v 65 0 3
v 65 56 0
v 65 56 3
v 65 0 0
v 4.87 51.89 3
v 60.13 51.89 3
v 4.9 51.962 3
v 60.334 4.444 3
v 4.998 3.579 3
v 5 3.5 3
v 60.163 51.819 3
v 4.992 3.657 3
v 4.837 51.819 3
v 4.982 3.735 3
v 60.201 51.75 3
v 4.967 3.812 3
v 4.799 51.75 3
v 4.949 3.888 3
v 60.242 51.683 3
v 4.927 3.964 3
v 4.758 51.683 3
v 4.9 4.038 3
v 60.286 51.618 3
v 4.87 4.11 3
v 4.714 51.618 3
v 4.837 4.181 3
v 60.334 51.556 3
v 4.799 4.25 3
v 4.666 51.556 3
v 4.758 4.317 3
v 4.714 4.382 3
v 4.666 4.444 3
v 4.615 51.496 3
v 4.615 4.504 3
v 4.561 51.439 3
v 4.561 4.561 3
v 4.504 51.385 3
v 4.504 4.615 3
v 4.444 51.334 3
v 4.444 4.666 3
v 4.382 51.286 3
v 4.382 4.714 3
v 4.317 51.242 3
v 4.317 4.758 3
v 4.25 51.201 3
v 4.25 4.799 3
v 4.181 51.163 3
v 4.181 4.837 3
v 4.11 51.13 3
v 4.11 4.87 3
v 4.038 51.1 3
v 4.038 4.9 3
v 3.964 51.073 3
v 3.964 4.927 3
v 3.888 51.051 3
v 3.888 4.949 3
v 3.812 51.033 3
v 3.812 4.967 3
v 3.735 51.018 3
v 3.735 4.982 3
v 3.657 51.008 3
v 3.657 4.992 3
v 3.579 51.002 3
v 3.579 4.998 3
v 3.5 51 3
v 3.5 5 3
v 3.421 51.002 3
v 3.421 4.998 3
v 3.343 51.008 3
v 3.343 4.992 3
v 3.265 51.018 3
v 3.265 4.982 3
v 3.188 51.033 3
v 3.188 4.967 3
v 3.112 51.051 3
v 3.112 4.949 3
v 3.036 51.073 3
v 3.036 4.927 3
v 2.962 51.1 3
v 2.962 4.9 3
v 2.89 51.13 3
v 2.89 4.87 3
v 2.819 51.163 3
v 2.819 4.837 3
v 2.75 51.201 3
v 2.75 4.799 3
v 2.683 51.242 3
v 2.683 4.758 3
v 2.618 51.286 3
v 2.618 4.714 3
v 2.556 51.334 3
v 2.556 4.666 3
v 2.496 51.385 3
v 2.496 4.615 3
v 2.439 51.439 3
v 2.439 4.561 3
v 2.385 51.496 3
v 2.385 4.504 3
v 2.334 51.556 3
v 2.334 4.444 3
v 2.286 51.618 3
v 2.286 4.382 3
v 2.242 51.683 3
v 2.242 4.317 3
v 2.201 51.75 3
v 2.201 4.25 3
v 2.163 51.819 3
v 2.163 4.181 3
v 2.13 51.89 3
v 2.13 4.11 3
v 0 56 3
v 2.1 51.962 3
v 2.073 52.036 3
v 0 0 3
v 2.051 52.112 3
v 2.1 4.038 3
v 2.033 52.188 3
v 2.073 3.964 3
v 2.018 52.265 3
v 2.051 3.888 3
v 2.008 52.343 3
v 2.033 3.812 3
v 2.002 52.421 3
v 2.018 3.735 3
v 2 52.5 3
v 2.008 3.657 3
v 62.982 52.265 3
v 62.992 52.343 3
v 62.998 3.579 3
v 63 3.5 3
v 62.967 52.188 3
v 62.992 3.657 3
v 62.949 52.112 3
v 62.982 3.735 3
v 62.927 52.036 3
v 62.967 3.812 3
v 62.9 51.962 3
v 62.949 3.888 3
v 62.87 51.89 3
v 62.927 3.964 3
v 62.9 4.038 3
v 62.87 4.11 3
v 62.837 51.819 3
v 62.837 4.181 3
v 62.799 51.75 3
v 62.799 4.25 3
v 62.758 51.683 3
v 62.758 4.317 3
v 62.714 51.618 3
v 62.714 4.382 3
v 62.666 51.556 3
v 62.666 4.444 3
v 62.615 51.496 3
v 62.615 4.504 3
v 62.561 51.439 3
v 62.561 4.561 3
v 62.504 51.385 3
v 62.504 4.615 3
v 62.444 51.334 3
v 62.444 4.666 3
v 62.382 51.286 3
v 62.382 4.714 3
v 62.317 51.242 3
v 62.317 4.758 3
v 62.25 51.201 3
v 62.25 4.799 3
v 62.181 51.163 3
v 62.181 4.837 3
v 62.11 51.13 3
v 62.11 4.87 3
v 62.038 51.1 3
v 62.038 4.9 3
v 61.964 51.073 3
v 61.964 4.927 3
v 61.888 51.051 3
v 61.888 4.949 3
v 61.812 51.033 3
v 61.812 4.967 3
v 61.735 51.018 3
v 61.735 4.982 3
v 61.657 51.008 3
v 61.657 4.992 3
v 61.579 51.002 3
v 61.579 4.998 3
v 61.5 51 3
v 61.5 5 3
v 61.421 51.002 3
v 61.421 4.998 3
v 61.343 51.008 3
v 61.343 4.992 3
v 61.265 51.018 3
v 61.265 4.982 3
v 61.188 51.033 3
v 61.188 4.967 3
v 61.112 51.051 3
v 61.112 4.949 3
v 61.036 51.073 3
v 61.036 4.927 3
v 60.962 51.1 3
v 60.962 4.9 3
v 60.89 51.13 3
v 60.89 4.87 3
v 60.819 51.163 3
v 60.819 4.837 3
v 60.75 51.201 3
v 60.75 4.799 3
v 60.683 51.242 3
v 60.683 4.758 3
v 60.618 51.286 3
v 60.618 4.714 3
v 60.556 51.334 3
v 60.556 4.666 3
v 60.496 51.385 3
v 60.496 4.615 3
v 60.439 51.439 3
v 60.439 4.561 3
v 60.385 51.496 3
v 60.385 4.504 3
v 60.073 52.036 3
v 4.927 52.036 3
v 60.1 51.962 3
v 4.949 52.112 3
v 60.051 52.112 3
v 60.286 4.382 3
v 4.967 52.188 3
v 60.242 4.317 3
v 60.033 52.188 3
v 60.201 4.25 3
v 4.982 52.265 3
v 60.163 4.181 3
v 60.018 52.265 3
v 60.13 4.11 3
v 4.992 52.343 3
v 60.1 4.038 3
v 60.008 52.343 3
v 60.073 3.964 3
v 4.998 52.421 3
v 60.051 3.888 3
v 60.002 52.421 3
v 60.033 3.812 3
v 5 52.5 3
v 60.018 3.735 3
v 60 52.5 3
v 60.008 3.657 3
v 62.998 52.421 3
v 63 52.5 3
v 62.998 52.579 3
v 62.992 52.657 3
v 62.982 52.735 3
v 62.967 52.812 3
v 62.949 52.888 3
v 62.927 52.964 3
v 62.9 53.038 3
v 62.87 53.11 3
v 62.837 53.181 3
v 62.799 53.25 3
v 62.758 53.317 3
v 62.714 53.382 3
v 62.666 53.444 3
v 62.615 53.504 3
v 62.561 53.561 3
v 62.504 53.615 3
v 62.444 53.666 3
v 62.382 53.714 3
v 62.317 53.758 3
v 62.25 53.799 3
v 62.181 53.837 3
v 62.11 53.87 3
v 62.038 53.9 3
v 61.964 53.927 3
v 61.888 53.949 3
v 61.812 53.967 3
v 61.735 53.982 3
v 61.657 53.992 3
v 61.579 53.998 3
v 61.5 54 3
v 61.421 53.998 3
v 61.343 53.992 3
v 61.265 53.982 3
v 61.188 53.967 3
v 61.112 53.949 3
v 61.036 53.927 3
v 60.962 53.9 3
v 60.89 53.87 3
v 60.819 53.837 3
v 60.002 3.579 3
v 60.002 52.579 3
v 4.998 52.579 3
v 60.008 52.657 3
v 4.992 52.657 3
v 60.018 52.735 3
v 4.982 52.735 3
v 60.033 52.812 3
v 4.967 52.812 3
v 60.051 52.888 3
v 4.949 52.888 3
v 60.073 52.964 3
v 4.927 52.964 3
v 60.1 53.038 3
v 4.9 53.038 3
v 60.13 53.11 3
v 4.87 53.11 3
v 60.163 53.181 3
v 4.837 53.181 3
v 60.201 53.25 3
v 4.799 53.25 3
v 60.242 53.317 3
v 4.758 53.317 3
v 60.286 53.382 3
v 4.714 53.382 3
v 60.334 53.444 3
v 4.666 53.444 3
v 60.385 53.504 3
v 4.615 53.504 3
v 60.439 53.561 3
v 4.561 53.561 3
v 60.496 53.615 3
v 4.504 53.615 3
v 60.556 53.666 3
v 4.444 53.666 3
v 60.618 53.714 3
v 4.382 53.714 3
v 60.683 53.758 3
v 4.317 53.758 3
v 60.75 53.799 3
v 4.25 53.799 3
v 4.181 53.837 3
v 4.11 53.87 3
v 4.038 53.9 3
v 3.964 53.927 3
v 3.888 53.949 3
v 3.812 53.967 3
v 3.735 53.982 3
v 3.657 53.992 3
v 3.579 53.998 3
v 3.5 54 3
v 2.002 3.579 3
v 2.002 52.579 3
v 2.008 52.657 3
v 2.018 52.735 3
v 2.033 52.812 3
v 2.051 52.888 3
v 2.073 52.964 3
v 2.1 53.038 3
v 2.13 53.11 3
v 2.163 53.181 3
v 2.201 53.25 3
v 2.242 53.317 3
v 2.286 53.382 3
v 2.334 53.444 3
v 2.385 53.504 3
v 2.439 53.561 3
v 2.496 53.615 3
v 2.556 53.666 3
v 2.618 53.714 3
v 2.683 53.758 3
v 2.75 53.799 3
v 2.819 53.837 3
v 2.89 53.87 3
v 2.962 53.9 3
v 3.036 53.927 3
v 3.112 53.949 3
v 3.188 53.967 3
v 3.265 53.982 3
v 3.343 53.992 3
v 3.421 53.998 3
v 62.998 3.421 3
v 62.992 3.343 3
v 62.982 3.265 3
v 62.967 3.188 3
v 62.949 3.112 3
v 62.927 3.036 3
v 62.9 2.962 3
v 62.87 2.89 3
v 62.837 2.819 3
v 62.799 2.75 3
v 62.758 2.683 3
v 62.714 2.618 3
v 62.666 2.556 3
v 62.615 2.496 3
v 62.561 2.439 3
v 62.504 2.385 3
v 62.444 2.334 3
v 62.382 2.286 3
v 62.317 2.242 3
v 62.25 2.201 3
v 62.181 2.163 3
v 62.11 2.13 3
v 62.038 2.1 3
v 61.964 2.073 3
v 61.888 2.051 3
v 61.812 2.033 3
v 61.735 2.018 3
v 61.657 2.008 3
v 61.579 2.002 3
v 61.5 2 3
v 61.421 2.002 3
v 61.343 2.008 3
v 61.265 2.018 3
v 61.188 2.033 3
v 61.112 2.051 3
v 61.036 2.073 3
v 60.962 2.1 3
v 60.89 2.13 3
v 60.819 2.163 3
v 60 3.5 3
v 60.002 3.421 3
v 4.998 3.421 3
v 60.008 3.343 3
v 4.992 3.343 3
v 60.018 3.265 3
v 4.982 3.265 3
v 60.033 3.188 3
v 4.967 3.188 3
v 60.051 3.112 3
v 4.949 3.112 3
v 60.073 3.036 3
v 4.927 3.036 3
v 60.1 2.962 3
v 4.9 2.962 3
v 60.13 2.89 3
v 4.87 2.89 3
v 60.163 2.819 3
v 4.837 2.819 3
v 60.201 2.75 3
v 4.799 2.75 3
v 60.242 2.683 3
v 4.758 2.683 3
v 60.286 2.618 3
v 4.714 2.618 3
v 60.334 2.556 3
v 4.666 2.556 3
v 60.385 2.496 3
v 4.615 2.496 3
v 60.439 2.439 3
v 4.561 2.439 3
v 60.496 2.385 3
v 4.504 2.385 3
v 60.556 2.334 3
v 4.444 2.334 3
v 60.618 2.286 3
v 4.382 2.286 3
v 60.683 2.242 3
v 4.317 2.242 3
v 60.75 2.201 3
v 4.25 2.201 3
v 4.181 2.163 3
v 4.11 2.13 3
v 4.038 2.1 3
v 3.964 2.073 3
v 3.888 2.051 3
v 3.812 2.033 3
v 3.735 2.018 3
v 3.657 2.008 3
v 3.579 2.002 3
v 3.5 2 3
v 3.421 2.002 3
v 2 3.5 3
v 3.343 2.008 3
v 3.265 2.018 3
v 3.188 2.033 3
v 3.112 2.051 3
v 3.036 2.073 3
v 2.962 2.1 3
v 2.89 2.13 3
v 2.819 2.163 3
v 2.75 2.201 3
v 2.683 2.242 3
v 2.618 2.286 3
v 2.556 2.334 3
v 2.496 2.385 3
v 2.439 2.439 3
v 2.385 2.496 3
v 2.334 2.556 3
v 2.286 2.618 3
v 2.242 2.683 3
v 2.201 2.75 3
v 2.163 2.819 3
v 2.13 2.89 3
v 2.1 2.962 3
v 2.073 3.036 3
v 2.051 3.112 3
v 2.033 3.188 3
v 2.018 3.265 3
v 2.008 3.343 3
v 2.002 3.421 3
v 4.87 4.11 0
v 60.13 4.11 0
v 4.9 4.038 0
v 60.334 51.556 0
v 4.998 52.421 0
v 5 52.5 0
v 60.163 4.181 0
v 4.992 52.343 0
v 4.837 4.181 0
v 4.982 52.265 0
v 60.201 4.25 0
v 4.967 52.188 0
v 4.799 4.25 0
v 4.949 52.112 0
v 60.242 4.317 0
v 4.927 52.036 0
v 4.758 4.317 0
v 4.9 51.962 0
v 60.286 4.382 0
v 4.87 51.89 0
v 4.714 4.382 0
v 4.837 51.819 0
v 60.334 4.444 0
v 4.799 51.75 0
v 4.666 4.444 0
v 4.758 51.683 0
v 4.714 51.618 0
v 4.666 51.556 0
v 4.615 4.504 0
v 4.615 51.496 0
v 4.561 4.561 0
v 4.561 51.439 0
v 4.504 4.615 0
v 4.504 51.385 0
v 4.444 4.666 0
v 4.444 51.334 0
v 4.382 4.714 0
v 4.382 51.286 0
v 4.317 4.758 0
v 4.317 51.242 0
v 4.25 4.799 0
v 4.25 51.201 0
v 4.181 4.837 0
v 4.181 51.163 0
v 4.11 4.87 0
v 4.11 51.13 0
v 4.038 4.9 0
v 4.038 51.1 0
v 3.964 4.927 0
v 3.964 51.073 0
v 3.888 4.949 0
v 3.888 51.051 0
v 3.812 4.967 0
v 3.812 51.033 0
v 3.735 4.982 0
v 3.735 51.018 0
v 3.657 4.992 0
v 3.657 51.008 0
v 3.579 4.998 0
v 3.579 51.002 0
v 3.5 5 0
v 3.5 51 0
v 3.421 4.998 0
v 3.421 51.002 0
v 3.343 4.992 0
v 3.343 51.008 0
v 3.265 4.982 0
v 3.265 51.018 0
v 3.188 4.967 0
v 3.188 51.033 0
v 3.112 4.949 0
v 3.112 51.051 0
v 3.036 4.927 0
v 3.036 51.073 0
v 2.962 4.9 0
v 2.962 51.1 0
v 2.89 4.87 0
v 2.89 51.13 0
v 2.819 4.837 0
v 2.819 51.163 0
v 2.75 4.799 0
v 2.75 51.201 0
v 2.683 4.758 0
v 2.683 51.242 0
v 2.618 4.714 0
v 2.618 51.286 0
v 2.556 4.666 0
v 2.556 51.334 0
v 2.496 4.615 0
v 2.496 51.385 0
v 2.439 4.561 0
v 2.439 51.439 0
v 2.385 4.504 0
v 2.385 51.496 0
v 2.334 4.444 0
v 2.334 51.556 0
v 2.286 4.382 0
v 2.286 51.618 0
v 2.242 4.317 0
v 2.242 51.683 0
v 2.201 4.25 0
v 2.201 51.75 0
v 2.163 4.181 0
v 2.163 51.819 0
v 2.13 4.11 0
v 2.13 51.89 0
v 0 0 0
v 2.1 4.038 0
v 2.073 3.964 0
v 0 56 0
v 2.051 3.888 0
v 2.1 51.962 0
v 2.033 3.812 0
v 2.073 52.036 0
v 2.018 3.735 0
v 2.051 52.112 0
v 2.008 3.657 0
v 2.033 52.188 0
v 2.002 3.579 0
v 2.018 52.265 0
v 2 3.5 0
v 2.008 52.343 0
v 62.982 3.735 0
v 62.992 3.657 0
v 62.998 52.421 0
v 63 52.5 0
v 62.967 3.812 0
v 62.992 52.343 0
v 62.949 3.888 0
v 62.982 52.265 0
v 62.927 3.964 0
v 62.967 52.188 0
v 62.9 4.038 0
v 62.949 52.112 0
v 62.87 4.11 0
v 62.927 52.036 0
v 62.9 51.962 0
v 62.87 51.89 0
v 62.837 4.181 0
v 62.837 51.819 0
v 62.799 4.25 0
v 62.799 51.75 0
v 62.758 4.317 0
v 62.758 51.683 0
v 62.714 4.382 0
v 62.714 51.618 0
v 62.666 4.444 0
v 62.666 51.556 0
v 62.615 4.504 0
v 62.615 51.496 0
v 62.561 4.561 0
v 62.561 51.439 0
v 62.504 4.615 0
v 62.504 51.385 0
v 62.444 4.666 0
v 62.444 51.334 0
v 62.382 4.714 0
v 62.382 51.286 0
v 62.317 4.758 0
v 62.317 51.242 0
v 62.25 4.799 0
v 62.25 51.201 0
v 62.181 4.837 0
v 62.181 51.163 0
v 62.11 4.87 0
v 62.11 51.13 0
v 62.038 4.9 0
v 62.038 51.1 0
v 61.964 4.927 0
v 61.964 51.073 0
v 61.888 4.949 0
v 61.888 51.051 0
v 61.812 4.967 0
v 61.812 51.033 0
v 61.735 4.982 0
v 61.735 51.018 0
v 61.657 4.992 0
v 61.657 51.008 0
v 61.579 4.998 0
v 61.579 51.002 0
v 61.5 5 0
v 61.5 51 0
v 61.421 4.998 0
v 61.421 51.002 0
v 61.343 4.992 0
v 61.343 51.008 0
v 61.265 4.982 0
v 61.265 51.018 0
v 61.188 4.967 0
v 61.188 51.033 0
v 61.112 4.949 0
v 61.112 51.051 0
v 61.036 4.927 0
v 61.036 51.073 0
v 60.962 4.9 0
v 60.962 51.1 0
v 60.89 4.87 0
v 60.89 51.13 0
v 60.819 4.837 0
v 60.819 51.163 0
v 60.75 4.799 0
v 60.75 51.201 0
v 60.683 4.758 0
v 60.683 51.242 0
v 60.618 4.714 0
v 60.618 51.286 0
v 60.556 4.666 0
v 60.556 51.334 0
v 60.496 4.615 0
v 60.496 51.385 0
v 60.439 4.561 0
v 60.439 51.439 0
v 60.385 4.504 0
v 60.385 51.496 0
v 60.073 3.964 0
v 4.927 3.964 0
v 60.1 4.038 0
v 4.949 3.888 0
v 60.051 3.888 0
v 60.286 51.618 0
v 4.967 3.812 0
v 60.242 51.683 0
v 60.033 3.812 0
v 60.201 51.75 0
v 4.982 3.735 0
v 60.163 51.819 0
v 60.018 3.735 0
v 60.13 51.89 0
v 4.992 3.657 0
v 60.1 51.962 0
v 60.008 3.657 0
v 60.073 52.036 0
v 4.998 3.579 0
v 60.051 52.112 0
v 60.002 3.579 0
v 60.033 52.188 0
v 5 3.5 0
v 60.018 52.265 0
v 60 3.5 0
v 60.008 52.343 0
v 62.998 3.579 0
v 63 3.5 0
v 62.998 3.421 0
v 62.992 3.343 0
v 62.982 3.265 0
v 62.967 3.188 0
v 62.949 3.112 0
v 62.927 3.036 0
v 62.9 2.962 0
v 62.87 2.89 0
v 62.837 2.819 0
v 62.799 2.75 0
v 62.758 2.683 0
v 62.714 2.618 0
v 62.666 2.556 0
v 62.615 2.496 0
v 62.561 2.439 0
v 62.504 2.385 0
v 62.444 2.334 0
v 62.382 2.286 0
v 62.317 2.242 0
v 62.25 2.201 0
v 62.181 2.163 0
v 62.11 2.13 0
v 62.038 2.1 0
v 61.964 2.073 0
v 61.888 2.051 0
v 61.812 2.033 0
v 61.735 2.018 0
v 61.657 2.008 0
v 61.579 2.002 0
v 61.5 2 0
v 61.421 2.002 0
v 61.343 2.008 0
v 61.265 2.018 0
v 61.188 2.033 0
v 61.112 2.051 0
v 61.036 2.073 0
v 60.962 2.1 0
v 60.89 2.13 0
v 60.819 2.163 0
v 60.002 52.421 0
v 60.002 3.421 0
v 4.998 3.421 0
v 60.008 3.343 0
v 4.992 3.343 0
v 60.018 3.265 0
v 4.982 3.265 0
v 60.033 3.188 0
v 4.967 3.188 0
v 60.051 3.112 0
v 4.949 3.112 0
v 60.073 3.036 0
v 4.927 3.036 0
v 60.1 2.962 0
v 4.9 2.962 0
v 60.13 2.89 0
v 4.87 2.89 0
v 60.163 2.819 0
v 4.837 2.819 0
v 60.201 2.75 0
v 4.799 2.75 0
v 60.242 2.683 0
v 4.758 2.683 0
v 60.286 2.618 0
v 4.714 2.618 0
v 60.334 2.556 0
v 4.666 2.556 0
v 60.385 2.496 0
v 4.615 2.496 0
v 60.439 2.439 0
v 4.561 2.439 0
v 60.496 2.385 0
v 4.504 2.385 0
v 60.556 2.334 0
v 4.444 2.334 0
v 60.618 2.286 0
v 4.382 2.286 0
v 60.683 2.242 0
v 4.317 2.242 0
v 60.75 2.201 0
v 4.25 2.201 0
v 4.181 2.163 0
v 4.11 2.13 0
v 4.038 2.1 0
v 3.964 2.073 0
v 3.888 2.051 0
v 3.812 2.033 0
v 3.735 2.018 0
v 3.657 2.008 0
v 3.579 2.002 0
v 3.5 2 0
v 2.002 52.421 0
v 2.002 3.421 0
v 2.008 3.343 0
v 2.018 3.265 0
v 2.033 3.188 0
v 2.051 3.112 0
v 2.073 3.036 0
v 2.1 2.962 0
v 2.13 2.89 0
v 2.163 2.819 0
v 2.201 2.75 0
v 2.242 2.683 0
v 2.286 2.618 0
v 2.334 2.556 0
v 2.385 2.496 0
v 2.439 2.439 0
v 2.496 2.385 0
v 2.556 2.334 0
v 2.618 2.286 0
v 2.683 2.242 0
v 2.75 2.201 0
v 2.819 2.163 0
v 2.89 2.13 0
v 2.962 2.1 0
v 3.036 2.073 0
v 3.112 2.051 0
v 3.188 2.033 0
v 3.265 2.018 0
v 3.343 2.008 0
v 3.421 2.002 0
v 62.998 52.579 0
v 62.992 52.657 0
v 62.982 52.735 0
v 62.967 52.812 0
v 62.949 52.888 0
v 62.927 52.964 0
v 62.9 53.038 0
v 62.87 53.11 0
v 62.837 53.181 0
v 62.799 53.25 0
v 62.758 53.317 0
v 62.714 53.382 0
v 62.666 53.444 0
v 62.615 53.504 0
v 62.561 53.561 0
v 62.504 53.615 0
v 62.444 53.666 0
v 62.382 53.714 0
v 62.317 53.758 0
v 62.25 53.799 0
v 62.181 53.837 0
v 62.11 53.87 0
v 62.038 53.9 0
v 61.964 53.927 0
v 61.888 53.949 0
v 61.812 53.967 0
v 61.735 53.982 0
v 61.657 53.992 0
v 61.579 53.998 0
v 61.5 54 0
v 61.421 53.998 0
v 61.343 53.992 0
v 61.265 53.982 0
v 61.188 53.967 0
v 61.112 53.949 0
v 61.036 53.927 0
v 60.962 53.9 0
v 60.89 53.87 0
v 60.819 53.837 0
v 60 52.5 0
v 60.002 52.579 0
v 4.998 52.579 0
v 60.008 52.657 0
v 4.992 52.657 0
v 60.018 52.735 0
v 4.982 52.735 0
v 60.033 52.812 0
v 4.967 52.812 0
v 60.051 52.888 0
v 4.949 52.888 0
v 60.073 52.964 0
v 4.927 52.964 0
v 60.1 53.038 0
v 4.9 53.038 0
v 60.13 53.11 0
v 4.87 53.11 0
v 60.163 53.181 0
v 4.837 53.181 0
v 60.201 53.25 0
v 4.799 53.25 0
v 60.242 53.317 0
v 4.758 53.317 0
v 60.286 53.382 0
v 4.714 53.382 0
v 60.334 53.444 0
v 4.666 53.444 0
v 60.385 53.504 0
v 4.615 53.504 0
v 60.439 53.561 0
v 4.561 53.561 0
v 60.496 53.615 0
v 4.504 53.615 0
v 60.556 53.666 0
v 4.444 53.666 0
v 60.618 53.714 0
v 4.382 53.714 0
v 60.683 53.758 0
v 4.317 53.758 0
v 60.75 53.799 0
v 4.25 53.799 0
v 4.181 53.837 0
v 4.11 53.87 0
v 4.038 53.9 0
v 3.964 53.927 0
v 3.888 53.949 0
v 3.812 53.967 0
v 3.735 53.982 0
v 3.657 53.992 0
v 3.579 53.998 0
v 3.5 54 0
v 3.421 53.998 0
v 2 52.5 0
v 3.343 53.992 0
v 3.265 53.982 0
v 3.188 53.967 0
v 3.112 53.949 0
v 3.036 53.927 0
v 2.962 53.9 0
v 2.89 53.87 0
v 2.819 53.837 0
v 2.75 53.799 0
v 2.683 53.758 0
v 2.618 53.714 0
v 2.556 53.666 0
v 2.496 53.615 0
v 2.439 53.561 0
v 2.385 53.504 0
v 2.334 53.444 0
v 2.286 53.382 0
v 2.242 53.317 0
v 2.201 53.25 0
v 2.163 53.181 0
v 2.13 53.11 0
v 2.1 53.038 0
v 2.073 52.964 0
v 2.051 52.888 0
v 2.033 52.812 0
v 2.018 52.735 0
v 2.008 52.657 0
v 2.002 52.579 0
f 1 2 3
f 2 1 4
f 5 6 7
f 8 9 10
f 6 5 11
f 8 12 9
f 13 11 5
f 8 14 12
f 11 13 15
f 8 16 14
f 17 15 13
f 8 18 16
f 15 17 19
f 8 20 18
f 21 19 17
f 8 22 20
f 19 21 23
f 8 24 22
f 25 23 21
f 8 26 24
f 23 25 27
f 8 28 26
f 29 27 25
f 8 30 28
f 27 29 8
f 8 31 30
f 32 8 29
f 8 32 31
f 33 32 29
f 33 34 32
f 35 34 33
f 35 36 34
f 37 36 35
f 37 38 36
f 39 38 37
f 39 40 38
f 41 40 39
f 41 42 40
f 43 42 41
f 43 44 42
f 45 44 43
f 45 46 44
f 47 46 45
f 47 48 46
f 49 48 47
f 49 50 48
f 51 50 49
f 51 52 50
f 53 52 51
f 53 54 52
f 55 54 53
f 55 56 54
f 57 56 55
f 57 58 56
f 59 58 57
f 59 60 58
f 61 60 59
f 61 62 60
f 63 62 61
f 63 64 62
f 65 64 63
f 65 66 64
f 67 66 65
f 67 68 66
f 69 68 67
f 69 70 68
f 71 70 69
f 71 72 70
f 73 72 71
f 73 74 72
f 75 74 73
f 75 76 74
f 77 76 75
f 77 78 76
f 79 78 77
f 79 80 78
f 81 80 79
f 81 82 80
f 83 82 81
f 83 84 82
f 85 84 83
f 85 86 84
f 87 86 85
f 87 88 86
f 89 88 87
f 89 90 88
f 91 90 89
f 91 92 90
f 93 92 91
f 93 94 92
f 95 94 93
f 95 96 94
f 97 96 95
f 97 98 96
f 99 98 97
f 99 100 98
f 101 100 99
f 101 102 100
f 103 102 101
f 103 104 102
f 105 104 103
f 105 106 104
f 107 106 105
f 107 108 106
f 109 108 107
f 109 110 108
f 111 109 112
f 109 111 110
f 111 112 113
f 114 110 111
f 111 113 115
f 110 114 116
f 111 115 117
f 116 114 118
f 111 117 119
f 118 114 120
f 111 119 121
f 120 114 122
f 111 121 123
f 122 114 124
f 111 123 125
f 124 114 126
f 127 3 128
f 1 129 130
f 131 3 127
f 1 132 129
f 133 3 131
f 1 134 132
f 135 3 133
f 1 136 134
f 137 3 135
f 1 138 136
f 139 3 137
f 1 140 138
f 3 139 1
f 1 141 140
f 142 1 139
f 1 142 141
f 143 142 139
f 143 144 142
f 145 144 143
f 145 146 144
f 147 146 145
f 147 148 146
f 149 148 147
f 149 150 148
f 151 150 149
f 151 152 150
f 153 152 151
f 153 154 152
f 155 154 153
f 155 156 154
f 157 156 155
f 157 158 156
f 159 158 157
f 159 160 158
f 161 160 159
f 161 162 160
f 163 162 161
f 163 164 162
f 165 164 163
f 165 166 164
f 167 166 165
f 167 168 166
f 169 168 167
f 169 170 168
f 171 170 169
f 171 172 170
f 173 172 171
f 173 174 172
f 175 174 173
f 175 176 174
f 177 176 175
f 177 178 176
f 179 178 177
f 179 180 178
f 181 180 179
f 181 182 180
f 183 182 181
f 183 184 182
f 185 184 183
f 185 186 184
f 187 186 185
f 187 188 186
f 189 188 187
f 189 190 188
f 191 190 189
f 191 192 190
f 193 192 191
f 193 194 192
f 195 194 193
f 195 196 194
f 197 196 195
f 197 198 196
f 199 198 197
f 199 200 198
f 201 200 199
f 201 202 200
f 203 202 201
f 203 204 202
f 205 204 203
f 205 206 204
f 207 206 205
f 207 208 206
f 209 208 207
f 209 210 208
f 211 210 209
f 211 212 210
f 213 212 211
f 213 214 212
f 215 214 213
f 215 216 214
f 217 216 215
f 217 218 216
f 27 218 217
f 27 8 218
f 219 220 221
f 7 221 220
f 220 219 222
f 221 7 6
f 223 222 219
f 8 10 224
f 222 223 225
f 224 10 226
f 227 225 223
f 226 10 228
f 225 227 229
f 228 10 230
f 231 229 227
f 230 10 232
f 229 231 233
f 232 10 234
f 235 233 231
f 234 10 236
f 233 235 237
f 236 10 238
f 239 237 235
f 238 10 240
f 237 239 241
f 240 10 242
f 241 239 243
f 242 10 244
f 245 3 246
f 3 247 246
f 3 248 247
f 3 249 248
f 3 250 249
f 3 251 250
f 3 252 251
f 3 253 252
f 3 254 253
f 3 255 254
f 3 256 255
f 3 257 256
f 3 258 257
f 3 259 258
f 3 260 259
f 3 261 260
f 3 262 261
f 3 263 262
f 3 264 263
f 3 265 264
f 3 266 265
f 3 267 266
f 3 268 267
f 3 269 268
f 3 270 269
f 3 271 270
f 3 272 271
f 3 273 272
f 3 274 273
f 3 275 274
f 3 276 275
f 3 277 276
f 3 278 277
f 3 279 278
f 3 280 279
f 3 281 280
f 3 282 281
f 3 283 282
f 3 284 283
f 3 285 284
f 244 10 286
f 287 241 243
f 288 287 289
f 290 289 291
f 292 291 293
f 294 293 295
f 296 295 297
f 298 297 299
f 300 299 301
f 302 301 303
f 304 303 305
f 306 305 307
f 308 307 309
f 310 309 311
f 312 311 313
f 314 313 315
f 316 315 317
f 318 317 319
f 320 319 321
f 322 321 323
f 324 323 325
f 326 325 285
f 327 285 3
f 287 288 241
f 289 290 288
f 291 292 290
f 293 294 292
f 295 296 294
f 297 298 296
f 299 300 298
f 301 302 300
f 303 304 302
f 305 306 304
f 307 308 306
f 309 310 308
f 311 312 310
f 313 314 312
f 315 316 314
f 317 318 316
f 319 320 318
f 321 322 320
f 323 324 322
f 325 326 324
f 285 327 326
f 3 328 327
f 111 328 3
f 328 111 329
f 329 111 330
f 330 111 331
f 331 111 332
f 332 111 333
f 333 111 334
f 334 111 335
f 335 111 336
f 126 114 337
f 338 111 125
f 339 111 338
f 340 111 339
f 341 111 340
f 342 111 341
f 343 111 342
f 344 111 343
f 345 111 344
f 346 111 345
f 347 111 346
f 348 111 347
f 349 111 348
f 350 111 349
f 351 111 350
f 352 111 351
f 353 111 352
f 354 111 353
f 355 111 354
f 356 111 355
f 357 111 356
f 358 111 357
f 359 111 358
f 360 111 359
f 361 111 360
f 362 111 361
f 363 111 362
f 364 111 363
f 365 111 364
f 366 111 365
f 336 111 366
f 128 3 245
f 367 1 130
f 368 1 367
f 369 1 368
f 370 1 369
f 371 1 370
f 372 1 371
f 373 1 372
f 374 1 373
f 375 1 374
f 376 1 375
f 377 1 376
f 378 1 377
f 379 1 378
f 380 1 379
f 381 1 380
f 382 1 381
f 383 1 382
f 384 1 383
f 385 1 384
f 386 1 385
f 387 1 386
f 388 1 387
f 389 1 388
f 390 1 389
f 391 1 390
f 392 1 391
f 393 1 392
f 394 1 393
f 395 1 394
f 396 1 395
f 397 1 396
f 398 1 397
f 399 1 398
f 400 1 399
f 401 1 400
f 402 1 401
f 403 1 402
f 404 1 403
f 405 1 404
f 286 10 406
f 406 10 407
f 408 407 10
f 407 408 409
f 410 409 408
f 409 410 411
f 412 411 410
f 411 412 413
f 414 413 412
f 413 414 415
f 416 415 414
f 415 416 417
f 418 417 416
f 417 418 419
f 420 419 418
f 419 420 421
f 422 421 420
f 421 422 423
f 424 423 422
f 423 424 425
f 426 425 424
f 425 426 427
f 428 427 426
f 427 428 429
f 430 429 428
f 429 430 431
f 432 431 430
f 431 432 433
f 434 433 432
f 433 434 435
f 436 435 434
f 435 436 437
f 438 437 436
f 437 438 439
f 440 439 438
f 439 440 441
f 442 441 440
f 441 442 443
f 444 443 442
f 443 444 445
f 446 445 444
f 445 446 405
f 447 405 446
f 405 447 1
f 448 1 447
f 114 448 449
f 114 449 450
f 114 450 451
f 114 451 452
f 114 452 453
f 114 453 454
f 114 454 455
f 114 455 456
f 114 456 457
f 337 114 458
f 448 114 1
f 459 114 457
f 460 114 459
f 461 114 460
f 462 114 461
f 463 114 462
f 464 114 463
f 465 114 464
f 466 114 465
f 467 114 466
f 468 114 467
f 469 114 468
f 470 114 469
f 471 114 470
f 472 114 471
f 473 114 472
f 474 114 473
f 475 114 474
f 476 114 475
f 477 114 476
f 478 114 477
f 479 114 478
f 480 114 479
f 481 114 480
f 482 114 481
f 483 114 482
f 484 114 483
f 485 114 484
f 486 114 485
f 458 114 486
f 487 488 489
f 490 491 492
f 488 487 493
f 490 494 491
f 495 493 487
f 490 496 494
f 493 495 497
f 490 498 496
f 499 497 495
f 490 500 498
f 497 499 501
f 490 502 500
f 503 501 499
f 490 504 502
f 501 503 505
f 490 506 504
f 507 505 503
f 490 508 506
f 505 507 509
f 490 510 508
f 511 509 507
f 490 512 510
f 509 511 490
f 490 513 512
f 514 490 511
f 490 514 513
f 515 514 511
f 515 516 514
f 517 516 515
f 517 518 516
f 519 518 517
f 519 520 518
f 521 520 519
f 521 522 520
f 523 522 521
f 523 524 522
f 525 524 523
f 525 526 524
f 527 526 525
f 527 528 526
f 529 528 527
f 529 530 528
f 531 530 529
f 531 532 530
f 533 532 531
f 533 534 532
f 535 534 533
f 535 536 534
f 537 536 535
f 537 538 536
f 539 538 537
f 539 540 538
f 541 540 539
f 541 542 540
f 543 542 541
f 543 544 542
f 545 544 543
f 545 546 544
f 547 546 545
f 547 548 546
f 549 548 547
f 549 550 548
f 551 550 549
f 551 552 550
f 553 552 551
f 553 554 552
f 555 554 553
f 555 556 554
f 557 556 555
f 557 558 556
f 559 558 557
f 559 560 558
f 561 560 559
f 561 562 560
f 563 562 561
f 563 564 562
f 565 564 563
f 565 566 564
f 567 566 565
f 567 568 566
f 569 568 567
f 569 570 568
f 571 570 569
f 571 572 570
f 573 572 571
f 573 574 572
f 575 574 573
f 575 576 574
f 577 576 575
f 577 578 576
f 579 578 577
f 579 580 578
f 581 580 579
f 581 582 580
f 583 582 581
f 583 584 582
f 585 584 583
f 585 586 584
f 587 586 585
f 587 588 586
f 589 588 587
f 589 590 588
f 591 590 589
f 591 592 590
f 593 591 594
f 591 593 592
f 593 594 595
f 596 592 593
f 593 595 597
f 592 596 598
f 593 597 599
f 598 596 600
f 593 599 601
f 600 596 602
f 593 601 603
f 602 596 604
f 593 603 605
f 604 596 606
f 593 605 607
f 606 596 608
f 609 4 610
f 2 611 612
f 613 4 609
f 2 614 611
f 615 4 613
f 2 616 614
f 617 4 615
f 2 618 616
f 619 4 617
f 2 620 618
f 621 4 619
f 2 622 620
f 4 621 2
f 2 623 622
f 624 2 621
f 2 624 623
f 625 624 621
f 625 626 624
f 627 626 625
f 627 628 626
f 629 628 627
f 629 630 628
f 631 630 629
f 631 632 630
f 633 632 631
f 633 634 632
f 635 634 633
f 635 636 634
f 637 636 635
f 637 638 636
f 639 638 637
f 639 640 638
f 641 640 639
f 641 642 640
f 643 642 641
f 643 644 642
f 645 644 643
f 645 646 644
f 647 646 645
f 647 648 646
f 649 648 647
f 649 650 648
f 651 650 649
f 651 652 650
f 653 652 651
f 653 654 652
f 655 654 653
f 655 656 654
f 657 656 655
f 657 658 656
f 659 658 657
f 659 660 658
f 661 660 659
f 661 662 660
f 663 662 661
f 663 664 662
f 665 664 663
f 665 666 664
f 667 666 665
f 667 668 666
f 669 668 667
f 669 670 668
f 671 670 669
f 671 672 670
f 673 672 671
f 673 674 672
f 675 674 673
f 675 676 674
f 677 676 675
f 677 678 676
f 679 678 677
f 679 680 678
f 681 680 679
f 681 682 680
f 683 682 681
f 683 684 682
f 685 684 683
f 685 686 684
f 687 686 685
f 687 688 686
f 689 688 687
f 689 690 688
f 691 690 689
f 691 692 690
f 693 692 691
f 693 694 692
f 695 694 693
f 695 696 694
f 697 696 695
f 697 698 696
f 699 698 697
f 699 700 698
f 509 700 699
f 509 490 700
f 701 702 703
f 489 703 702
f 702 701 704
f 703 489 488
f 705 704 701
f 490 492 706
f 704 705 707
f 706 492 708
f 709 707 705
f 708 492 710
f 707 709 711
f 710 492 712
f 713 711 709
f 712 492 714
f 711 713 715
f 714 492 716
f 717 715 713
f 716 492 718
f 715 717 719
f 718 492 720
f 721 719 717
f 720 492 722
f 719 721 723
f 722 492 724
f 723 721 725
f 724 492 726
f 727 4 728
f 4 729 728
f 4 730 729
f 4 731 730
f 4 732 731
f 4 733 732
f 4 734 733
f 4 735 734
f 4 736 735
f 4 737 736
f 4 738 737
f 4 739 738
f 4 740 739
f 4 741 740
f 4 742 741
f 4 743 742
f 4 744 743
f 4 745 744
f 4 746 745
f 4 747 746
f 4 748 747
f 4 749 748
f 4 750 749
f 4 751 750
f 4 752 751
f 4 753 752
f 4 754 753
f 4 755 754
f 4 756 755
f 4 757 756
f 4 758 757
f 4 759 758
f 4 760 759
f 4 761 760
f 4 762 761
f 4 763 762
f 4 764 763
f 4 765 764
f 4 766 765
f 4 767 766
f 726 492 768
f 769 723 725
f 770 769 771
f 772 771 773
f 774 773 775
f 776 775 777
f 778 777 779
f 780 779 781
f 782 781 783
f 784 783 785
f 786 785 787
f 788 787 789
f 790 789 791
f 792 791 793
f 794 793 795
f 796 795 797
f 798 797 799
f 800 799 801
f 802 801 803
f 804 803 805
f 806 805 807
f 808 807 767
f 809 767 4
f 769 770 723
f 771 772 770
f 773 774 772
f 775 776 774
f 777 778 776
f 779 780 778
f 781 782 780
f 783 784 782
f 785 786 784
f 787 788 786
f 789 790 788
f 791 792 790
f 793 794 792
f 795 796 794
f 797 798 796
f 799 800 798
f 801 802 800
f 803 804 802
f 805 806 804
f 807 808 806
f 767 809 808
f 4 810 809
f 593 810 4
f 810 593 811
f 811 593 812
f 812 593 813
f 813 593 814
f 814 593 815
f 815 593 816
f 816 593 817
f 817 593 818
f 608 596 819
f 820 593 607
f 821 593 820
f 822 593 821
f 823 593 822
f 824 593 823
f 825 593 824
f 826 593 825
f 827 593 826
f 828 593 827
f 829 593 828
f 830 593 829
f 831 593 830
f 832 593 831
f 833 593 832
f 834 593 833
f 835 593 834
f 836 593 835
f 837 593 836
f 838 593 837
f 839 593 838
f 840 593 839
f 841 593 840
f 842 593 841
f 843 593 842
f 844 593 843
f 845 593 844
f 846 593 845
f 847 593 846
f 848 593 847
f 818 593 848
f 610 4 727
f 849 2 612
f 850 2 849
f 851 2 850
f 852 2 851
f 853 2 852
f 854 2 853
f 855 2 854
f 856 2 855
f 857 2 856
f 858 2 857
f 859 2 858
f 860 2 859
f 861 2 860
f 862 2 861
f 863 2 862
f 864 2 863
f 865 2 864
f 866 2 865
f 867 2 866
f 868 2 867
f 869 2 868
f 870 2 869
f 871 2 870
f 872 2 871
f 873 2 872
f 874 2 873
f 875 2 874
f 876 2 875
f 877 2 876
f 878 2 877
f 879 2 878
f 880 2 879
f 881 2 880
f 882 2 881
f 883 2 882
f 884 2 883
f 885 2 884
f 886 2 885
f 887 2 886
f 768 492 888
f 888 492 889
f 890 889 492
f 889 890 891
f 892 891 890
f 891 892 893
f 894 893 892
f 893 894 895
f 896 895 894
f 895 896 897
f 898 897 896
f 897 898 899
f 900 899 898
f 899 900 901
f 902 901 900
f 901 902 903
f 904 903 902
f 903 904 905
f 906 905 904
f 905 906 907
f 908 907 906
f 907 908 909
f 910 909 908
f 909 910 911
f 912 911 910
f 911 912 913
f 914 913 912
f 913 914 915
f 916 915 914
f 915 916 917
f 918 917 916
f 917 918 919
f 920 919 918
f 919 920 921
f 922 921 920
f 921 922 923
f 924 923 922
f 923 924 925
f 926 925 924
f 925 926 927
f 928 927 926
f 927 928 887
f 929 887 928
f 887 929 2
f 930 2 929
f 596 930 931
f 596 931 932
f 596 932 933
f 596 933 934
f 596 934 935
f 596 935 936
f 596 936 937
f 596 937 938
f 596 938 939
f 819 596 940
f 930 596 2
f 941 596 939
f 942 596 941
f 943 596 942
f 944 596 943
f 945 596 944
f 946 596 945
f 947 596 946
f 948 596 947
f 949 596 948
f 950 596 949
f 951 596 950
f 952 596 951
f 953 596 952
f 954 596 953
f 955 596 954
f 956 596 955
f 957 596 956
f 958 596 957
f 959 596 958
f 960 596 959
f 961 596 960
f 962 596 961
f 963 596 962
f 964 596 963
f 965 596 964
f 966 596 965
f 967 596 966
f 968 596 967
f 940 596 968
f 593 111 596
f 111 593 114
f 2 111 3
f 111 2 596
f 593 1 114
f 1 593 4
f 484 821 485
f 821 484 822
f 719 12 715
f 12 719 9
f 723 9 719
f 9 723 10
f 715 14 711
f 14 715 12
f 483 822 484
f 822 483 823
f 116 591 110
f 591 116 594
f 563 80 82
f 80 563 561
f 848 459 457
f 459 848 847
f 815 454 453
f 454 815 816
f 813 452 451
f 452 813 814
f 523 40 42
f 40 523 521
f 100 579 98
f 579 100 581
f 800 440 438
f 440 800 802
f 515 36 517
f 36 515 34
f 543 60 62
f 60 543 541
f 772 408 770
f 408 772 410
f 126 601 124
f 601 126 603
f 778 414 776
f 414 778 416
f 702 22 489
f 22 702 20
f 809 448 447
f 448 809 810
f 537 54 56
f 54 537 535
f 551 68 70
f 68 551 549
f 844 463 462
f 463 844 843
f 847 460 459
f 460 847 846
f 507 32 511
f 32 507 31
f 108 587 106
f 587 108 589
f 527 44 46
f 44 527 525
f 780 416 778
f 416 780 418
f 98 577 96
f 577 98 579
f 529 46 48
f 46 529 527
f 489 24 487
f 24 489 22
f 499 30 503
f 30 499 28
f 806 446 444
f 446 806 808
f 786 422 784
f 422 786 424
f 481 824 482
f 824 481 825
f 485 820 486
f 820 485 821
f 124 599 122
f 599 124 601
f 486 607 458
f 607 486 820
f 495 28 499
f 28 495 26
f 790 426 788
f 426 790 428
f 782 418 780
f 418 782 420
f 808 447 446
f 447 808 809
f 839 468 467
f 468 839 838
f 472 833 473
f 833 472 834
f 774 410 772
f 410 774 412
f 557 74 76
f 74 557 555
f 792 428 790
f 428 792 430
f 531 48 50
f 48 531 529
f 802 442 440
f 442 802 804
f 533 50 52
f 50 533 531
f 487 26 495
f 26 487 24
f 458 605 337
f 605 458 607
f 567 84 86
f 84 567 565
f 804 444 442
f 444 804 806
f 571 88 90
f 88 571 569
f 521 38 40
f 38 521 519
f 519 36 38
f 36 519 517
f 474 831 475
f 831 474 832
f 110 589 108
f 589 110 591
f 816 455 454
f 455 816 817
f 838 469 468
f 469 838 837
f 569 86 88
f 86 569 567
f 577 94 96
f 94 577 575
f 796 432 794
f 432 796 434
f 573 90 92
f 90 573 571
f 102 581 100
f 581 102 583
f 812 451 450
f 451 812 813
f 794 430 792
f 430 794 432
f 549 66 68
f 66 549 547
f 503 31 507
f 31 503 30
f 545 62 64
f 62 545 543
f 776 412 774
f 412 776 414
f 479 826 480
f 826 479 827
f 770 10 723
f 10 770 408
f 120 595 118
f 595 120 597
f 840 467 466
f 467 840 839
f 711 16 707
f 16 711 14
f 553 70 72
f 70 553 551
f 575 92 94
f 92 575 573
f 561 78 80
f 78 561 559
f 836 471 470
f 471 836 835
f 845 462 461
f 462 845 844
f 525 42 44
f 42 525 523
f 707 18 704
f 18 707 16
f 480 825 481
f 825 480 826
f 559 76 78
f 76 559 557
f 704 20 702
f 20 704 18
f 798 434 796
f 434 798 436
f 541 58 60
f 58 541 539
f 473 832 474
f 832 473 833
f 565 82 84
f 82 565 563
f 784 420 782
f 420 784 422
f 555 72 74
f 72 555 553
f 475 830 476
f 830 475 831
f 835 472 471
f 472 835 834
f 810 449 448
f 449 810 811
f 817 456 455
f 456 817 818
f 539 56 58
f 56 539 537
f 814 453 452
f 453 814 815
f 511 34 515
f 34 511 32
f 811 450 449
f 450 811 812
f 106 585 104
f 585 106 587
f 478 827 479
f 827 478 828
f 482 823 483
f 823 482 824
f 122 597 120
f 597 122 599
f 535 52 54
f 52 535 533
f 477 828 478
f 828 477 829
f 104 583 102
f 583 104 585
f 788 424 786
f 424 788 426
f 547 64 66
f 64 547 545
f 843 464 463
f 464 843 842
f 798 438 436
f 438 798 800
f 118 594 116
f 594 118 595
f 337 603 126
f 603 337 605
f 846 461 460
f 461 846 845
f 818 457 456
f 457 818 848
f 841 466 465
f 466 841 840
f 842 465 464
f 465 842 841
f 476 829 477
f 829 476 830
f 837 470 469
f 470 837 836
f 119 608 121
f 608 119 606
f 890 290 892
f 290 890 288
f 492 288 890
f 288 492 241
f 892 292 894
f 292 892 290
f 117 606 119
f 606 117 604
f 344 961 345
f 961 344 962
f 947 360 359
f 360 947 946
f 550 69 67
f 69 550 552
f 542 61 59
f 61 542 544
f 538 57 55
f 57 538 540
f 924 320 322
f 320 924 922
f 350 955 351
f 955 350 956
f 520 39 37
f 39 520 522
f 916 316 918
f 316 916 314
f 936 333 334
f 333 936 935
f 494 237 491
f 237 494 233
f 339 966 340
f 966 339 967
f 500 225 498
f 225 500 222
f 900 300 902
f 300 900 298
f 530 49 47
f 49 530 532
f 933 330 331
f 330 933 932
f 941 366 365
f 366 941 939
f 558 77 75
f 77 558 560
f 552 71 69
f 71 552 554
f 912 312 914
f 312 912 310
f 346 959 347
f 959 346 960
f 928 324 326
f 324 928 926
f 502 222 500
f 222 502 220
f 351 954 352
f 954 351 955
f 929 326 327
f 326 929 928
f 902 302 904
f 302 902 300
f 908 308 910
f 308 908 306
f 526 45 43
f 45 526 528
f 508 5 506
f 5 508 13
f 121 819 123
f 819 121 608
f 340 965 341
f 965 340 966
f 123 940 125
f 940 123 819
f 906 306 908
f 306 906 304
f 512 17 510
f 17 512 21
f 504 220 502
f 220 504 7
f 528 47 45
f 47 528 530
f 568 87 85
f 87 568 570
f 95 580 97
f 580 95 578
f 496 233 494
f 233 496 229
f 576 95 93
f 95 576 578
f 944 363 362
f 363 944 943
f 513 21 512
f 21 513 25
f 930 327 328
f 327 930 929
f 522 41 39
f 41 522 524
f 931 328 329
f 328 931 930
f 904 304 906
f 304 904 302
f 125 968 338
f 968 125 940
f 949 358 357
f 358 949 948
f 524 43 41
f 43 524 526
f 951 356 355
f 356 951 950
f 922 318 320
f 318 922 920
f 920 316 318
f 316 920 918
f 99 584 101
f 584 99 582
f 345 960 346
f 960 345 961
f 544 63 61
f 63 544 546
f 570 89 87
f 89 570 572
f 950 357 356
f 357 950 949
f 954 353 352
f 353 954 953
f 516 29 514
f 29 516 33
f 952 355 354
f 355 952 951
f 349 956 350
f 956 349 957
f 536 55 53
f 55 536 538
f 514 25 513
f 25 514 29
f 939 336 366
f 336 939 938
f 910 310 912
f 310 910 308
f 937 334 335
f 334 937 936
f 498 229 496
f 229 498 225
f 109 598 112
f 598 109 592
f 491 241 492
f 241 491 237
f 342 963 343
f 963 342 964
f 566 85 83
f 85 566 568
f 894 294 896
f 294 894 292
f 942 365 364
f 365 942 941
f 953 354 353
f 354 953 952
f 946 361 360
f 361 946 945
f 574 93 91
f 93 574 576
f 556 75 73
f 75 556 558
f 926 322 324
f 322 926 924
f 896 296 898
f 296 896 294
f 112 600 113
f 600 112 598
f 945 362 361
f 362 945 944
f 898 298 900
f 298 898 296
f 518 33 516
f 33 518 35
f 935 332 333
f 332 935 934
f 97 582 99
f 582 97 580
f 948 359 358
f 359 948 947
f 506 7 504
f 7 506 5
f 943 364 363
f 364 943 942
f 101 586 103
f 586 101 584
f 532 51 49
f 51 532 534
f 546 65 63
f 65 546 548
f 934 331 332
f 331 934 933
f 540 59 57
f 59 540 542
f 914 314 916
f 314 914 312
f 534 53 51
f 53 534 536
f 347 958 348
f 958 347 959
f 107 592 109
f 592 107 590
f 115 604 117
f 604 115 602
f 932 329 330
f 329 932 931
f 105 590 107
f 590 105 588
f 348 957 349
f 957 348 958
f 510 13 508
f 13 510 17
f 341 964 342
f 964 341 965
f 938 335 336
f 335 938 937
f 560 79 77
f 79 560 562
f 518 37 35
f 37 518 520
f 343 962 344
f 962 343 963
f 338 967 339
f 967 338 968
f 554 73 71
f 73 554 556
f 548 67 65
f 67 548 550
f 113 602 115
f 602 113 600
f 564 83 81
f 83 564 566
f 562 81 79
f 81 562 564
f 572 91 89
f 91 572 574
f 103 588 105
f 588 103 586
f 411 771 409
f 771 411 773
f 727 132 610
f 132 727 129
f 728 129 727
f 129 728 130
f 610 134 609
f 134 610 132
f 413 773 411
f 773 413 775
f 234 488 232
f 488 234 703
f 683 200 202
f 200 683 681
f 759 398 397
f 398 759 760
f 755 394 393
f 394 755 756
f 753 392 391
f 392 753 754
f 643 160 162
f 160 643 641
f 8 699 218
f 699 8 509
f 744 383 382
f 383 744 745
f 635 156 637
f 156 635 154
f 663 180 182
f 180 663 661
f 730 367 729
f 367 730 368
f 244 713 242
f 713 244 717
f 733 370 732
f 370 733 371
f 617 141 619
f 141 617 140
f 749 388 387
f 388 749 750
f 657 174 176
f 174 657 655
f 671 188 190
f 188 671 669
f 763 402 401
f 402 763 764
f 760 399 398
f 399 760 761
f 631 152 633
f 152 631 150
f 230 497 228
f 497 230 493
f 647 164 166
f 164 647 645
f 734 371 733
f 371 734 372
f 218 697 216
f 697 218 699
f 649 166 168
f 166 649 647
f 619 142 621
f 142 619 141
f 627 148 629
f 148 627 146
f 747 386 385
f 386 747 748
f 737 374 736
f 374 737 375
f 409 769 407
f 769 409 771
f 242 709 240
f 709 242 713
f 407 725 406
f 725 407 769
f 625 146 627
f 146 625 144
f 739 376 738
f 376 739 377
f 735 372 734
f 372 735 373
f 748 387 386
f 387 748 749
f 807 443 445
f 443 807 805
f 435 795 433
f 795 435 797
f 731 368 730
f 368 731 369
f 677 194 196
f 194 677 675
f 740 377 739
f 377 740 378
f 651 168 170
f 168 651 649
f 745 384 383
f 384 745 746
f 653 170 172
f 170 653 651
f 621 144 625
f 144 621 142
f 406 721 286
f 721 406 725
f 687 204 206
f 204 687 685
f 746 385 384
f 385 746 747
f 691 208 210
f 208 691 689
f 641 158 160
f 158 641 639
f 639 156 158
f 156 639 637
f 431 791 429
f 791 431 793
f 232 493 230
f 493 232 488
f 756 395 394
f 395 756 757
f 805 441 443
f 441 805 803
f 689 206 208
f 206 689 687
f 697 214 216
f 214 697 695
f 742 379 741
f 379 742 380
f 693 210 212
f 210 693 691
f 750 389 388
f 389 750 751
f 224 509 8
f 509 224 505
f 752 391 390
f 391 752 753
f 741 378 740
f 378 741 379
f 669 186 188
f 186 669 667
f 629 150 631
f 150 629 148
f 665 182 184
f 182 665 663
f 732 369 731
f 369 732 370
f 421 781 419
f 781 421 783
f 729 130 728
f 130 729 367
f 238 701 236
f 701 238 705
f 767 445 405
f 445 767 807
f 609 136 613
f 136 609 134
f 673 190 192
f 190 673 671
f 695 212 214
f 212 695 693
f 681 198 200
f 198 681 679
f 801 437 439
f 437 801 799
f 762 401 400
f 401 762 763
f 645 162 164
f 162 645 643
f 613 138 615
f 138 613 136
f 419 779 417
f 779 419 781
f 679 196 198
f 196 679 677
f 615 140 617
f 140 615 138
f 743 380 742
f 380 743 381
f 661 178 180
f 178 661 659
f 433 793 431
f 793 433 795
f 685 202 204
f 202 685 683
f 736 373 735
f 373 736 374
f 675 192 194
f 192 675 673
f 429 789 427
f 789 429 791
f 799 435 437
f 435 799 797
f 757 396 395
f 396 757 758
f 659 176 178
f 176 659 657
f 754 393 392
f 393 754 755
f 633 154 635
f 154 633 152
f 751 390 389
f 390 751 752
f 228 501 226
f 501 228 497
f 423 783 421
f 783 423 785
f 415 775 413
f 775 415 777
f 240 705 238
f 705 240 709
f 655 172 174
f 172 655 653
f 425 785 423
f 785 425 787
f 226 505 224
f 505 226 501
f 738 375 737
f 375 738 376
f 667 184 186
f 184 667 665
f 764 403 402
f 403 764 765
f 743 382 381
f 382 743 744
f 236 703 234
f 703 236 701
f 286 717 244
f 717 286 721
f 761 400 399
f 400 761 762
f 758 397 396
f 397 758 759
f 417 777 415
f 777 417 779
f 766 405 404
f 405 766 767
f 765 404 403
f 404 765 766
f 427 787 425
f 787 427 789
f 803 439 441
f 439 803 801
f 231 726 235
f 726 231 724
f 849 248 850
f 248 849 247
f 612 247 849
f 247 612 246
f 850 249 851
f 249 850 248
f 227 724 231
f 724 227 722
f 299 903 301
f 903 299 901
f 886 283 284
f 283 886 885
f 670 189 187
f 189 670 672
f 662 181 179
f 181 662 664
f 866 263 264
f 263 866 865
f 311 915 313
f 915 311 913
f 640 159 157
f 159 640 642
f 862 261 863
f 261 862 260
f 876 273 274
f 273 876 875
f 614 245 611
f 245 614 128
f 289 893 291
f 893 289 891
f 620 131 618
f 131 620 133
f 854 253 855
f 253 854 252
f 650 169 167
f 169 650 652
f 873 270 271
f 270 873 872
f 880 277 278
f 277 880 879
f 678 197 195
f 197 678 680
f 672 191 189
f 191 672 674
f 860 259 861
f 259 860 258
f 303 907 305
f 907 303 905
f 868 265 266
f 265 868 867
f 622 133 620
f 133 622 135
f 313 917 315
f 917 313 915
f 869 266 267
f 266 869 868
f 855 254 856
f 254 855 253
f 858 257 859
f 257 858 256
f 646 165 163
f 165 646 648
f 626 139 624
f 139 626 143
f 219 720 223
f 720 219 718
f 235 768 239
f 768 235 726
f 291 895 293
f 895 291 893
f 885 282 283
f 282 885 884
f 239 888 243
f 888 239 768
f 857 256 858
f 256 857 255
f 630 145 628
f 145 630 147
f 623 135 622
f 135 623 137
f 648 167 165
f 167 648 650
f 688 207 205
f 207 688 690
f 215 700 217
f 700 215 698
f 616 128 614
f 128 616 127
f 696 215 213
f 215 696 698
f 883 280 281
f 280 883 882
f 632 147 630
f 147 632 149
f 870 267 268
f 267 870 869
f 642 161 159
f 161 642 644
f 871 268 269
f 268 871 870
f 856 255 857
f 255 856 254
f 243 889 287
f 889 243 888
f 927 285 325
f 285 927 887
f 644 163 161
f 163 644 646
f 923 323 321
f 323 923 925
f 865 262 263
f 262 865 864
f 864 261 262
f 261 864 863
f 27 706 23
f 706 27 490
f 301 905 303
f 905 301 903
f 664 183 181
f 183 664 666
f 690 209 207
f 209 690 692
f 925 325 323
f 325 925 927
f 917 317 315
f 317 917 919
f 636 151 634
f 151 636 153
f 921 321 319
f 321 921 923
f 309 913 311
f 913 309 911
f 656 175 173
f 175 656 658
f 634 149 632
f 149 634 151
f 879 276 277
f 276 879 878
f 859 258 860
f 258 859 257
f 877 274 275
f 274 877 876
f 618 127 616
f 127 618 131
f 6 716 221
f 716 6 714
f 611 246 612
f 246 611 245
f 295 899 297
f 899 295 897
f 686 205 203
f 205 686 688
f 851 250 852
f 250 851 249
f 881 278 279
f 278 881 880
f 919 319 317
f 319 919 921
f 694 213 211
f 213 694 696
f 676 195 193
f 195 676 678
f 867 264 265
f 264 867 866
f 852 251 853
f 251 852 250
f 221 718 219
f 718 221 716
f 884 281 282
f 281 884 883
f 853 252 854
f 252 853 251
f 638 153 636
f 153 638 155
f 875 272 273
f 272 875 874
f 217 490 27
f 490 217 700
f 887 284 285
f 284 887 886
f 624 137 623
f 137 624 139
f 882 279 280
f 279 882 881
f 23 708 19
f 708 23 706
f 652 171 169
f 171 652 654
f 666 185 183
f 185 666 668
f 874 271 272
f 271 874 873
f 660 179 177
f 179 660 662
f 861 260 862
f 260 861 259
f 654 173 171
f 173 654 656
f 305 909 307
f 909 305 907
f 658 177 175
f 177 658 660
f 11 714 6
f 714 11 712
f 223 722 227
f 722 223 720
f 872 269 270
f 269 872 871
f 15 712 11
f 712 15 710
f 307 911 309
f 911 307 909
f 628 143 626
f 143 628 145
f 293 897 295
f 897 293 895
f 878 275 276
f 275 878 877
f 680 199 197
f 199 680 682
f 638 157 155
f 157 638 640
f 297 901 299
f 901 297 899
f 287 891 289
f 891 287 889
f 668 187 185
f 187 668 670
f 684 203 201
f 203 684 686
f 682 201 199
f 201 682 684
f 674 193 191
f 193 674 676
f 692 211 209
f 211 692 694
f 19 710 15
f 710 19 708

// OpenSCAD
// camera hat for rpi

CX=65/2;
CY=59/2;
FN=120;


module mtg_hole(x,y,z,dia)
{
    translate([x,y,z-.1]) color("red") cylinder(d=dia,h=3.2,$fn=FN);
    
    }

   
module baseHat()
   { 
    difference()
    {
cube([65,56,3]);

mtg_hole(3.5,3.5,0,3);
mtg_hole(3.5,49+3.5,0,3);
mtg_hole(58+3.5,3.5,0,3);
mtg_hole(58+3.5,49+3.5,0,3);      

    }
        
}
 
baseHat();
        
